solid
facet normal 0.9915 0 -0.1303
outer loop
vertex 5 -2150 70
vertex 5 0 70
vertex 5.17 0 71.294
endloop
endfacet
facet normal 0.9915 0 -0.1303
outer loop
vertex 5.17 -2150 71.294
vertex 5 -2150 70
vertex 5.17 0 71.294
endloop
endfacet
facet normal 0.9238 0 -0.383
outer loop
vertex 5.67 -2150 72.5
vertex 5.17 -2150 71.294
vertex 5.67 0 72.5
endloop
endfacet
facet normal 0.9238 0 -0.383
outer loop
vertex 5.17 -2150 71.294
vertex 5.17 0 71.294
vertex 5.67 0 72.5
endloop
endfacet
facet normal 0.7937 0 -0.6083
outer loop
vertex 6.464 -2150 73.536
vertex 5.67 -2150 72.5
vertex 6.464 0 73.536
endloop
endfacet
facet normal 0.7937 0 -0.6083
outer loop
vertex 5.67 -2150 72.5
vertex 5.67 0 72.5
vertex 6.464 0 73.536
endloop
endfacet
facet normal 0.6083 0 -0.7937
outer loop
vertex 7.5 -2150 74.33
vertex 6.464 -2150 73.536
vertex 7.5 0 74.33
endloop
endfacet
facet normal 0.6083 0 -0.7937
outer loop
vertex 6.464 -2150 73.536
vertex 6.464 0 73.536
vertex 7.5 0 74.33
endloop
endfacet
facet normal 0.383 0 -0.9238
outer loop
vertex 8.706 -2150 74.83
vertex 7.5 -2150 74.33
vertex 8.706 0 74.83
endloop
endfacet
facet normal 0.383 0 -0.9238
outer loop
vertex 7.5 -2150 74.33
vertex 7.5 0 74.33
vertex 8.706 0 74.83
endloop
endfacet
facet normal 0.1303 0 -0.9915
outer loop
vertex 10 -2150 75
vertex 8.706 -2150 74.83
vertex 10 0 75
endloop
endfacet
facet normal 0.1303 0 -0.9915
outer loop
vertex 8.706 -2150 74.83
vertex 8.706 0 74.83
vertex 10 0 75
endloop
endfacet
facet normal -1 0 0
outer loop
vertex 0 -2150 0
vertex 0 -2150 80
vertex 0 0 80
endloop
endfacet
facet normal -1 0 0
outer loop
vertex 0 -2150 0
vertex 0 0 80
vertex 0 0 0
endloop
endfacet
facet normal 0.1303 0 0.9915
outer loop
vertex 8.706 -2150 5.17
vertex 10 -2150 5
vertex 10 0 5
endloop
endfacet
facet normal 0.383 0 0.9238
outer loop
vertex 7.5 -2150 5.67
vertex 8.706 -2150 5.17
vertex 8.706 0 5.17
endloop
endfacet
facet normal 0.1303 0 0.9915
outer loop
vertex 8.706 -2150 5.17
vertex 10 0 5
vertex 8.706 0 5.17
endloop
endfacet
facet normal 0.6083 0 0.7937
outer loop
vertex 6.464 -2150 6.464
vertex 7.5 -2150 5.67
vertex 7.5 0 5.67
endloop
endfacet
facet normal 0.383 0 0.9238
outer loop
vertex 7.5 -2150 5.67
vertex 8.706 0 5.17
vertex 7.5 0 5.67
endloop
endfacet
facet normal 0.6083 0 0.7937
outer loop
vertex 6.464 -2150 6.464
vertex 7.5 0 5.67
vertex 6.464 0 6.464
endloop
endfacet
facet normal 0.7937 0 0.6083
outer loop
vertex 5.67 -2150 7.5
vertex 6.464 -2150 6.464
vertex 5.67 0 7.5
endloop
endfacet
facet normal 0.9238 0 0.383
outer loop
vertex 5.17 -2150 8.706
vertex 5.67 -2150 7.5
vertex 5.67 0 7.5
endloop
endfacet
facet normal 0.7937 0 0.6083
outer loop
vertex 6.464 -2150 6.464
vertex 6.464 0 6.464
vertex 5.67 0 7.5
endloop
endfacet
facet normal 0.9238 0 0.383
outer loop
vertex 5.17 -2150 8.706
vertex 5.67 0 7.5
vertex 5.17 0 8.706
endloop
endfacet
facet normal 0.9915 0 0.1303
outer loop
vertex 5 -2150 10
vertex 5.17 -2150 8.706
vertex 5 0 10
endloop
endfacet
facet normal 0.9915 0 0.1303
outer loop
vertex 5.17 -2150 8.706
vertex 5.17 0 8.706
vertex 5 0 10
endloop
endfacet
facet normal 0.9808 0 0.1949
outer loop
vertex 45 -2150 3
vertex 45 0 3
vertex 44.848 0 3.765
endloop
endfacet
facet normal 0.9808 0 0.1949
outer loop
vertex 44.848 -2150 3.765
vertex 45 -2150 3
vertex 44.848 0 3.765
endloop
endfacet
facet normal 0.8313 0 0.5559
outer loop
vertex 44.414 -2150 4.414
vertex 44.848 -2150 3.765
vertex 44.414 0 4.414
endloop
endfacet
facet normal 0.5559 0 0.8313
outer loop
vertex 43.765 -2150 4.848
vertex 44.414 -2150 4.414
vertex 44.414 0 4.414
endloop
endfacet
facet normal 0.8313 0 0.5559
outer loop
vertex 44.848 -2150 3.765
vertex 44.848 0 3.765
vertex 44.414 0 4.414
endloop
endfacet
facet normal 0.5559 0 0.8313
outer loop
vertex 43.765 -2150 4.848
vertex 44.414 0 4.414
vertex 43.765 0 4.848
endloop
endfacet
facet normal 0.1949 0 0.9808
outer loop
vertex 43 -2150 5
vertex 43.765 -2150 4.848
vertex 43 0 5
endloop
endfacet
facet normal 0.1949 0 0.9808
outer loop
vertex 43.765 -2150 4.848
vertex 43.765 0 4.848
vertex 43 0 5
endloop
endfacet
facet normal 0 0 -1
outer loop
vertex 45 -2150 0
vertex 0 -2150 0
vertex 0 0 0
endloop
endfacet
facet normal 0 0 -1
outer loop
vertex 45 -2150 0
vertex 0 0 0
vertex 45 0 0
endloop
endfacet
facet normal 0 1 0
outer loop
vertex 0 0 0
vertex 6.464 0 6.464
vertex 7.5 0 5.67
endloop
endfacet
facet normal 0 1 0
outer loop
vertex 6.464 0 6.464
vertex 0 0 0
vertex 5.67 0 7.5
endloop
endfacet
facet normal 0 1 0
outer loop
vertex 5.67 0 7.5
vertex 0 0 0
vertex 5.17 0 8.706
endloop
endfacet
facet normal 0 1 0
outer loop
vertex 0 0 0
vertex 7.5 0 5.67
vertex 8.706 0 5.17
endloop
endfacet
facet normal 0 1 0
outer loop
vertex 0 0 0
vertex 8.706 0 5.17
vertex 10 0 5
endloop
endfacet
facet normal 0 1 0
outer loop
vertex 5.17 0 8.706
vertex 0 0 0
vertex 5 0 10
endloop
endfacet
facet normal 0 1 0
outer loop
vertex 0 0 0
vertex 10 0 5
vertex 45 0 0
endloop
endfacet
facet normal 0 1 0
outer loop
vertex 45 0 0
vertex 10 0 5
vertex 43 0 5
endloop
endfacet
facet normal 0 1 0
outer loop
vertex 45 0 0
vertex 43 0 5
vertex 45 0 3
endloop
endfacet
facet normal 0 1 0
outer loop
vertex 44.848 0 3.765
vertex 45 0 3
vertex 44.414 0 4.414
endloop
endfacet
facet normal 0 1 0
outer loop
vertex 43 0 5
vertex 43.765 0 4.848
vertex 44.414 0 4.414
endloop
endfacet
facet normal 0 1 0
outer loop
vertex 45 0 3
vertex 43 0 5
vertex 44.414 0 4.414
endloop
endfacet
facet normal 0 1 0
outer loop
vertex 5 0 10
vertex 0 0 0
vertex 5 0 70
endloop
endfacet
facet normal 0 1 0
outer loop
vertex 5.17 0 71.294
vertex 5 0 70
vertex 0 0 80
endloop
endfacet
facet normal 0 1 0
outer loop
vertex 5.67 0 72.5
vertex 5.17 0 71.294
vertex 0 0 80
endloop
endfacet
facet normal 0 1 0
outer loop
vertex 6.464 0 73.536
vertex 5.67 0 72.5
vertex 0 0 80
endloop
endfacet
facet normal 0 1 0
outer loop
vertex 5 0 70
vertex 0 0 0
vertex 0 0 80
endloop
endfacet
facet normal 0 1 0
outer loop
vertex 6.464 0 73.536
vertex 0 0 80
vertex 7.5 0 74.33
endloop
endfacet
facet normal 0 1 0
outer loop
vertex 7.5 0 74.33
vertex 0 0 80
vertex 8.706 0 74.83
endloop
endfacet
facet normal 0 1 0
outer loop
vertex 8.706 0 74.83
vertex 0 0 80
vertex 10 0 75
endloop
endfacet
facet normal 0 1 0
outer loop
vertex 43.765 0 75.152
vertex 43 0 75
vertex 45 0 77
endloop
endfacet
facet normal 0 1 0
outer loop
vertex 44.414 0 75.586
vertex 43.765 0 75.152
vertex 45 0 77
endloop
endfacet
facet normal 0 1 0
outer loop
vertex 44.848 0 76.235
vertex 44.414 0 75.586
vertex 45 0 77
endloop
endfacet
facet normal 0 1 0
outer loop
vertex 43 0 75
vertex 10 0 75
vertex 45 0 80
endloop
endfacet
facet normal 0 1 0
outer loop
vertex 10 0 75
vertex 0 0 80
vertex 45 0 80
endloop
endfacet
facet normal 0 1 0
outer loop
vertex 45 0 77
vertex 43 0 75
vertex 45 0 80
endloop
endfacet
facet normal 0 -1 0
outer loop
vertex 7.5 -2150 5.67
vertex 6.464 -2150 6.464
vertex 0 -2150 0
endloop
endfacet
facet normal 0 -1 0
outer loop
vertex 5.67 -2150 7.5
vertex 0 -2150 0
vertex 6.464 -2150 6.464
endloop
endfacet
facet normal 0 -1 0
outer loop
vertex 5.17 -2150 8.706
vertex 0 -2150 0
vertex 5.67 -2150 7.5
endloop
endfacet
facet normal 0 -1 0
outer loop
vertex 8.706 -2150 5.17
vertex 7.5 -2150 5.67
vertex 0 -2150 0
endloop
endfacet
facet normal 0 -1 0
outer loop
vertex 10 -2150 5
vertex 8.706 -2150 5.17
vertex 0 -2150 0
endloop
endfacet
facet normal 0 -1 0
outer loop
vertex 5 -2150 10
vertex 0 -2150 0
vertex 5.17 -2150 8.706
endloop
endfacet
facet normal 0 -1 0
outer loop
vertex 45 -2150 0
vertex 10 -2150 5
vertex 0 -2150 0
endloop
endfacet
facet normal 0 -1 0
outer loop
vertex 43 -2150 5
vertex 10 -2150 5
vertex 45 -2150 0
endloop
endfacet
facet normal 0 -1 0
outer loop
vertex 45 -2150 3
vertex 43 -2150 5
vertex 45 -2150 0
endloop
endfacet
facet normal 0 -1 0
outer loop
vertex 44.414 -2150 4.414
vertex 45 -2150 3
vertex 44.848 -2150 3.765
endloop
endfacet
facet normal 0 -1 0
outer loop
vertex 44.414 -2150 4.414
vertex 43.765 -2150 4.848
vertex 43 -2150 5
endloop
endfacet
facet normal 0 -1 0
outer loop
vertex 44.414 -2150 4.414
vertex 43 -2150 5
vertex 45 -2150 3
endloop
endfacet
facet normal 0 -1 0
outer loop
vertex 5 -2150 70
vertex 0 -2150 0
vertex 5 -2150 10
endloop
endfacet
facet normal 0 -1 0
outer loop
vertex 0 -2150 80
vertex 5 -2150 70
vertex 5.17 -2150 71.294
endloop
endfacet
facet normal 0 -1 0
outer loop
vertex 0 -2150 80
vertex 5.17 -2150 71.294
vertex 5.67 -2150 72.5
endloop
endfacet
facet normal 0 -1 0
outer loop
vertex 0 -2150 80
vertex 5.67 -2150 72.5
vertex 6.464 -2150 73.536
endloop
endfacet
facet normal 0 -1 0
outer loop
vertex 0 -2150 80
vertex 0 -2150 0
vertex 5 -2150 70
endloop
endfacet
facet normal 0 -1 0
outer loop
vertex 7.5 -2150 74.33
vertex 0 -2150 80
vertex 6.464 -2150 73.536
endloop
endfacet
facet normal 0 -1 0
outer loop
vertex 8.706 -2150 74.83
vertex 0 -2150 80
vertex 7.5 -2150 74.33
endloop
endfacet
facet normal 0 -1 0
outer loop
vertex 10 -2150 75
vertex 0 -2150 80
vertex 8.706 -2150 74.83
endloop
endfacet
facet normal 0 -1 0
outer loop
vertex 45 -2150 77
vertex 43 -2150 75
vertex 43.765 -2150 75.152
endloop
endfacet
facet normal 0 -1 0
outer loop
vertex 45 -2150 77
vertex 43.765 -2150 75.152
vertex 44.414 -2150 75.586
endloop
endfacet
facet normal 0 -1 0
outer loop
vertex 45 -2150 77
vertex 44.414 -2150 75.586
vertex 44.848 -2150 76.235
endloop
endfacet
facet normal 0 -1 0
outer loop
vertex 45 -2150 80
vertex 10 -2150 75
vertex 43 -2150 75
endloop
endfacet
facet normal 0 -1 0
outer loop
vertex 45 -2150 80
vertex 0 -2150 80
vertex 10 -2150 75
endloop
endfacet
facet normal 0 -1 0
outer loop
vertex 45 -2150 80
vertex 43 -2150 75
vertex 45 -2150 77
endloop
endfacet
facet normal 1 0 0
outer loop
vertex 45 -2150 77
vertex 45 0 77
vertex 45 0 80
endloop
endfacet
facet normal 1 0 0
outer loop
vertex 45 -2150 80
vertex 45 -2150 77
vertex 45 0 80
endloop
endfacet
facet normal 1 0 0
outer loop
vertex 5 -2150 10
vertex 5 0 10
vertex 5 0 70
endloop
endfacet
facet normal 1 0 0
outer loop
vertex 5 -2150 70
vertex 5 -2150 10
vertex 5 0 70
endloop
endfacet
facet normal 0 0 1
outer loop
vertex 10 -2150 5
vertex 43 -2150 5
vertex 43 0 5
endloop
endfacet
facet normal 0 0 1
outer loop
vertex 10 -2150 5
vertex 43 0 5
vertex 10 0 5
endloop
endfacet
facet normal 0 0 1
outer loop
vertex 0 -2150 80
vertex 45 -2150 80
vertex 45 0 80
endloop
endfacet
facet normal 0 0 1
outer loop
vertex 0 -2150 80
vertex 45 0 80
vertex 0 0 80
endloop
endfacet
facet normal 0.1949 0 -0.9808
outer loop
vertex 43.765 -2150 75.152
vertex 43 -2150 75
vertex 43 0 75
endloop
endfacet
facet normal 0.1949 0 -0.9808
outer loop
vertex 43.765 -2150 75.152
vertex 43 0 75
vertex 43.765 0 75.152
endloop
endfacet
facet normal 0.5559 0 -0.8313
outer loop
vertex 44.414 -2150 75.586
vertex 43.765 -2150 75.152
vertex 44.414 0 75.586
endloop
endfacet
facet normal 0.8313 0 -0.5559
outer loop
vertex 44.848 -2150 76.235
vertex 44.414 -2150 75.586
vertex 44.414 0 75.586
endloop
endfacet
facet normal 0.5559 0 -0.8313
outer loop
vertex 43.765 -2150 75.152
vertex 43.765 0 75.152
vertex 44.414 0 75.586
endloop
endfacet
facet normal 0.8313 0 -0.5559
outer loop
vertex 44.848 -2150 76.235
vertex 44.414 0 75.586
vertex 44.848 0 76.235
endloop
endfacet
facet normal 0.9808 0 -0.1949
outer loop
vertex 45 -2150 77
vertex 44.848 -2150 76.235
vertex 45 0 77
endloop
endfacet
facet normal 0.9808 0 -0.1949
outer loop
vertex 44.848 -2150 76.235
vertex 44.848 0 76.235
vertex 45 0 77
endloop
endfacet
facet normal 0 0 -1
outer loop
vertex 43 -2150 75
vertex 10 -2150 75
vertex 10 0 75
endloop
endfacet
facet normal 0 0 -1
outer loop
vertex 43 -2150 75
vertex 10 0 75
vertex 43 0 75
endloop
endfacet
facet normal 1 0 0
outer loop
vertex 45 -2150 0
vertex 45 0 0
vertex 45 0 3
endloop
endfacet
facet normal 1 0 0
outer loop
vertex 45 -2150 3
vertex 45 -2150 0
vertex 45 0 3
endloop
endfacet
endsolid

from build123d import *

# Parameters (mm, degrees)
F1_DEPTH = 2150


with BuildPart() as f1:
    # F0 (on Front) → F1 (new body)
    with BuildSketch(Plane.XZ):
        with BuildLine():
            Line((0, 80), (0, 0))
            Line((0, 0), (45, 0))
            Line((45, 0), (45, 3))
            ThreePointArc((45, 3), (44.414214, 4.414214), (43, 5))
            Line((43, 5), (10, 5))
            ThreePointArc((10, 5), (6.464466, 6.464466), (5, 10))
            Line((5, 10), (5, 70))
            ThreePointArc((5, 70), (6.464466, 73.535534), (10, 75))
            Line((10, 75), (43, 75))
            ThreePointArc((43, 75), (44.414214, 75.585786), (45, 77))
            Line((45, 77), (45, 80))
            Line((45, 80), (0, 80))
        make_face()
    extrude(amount=F1_DEPTH)


solid = f1.part
